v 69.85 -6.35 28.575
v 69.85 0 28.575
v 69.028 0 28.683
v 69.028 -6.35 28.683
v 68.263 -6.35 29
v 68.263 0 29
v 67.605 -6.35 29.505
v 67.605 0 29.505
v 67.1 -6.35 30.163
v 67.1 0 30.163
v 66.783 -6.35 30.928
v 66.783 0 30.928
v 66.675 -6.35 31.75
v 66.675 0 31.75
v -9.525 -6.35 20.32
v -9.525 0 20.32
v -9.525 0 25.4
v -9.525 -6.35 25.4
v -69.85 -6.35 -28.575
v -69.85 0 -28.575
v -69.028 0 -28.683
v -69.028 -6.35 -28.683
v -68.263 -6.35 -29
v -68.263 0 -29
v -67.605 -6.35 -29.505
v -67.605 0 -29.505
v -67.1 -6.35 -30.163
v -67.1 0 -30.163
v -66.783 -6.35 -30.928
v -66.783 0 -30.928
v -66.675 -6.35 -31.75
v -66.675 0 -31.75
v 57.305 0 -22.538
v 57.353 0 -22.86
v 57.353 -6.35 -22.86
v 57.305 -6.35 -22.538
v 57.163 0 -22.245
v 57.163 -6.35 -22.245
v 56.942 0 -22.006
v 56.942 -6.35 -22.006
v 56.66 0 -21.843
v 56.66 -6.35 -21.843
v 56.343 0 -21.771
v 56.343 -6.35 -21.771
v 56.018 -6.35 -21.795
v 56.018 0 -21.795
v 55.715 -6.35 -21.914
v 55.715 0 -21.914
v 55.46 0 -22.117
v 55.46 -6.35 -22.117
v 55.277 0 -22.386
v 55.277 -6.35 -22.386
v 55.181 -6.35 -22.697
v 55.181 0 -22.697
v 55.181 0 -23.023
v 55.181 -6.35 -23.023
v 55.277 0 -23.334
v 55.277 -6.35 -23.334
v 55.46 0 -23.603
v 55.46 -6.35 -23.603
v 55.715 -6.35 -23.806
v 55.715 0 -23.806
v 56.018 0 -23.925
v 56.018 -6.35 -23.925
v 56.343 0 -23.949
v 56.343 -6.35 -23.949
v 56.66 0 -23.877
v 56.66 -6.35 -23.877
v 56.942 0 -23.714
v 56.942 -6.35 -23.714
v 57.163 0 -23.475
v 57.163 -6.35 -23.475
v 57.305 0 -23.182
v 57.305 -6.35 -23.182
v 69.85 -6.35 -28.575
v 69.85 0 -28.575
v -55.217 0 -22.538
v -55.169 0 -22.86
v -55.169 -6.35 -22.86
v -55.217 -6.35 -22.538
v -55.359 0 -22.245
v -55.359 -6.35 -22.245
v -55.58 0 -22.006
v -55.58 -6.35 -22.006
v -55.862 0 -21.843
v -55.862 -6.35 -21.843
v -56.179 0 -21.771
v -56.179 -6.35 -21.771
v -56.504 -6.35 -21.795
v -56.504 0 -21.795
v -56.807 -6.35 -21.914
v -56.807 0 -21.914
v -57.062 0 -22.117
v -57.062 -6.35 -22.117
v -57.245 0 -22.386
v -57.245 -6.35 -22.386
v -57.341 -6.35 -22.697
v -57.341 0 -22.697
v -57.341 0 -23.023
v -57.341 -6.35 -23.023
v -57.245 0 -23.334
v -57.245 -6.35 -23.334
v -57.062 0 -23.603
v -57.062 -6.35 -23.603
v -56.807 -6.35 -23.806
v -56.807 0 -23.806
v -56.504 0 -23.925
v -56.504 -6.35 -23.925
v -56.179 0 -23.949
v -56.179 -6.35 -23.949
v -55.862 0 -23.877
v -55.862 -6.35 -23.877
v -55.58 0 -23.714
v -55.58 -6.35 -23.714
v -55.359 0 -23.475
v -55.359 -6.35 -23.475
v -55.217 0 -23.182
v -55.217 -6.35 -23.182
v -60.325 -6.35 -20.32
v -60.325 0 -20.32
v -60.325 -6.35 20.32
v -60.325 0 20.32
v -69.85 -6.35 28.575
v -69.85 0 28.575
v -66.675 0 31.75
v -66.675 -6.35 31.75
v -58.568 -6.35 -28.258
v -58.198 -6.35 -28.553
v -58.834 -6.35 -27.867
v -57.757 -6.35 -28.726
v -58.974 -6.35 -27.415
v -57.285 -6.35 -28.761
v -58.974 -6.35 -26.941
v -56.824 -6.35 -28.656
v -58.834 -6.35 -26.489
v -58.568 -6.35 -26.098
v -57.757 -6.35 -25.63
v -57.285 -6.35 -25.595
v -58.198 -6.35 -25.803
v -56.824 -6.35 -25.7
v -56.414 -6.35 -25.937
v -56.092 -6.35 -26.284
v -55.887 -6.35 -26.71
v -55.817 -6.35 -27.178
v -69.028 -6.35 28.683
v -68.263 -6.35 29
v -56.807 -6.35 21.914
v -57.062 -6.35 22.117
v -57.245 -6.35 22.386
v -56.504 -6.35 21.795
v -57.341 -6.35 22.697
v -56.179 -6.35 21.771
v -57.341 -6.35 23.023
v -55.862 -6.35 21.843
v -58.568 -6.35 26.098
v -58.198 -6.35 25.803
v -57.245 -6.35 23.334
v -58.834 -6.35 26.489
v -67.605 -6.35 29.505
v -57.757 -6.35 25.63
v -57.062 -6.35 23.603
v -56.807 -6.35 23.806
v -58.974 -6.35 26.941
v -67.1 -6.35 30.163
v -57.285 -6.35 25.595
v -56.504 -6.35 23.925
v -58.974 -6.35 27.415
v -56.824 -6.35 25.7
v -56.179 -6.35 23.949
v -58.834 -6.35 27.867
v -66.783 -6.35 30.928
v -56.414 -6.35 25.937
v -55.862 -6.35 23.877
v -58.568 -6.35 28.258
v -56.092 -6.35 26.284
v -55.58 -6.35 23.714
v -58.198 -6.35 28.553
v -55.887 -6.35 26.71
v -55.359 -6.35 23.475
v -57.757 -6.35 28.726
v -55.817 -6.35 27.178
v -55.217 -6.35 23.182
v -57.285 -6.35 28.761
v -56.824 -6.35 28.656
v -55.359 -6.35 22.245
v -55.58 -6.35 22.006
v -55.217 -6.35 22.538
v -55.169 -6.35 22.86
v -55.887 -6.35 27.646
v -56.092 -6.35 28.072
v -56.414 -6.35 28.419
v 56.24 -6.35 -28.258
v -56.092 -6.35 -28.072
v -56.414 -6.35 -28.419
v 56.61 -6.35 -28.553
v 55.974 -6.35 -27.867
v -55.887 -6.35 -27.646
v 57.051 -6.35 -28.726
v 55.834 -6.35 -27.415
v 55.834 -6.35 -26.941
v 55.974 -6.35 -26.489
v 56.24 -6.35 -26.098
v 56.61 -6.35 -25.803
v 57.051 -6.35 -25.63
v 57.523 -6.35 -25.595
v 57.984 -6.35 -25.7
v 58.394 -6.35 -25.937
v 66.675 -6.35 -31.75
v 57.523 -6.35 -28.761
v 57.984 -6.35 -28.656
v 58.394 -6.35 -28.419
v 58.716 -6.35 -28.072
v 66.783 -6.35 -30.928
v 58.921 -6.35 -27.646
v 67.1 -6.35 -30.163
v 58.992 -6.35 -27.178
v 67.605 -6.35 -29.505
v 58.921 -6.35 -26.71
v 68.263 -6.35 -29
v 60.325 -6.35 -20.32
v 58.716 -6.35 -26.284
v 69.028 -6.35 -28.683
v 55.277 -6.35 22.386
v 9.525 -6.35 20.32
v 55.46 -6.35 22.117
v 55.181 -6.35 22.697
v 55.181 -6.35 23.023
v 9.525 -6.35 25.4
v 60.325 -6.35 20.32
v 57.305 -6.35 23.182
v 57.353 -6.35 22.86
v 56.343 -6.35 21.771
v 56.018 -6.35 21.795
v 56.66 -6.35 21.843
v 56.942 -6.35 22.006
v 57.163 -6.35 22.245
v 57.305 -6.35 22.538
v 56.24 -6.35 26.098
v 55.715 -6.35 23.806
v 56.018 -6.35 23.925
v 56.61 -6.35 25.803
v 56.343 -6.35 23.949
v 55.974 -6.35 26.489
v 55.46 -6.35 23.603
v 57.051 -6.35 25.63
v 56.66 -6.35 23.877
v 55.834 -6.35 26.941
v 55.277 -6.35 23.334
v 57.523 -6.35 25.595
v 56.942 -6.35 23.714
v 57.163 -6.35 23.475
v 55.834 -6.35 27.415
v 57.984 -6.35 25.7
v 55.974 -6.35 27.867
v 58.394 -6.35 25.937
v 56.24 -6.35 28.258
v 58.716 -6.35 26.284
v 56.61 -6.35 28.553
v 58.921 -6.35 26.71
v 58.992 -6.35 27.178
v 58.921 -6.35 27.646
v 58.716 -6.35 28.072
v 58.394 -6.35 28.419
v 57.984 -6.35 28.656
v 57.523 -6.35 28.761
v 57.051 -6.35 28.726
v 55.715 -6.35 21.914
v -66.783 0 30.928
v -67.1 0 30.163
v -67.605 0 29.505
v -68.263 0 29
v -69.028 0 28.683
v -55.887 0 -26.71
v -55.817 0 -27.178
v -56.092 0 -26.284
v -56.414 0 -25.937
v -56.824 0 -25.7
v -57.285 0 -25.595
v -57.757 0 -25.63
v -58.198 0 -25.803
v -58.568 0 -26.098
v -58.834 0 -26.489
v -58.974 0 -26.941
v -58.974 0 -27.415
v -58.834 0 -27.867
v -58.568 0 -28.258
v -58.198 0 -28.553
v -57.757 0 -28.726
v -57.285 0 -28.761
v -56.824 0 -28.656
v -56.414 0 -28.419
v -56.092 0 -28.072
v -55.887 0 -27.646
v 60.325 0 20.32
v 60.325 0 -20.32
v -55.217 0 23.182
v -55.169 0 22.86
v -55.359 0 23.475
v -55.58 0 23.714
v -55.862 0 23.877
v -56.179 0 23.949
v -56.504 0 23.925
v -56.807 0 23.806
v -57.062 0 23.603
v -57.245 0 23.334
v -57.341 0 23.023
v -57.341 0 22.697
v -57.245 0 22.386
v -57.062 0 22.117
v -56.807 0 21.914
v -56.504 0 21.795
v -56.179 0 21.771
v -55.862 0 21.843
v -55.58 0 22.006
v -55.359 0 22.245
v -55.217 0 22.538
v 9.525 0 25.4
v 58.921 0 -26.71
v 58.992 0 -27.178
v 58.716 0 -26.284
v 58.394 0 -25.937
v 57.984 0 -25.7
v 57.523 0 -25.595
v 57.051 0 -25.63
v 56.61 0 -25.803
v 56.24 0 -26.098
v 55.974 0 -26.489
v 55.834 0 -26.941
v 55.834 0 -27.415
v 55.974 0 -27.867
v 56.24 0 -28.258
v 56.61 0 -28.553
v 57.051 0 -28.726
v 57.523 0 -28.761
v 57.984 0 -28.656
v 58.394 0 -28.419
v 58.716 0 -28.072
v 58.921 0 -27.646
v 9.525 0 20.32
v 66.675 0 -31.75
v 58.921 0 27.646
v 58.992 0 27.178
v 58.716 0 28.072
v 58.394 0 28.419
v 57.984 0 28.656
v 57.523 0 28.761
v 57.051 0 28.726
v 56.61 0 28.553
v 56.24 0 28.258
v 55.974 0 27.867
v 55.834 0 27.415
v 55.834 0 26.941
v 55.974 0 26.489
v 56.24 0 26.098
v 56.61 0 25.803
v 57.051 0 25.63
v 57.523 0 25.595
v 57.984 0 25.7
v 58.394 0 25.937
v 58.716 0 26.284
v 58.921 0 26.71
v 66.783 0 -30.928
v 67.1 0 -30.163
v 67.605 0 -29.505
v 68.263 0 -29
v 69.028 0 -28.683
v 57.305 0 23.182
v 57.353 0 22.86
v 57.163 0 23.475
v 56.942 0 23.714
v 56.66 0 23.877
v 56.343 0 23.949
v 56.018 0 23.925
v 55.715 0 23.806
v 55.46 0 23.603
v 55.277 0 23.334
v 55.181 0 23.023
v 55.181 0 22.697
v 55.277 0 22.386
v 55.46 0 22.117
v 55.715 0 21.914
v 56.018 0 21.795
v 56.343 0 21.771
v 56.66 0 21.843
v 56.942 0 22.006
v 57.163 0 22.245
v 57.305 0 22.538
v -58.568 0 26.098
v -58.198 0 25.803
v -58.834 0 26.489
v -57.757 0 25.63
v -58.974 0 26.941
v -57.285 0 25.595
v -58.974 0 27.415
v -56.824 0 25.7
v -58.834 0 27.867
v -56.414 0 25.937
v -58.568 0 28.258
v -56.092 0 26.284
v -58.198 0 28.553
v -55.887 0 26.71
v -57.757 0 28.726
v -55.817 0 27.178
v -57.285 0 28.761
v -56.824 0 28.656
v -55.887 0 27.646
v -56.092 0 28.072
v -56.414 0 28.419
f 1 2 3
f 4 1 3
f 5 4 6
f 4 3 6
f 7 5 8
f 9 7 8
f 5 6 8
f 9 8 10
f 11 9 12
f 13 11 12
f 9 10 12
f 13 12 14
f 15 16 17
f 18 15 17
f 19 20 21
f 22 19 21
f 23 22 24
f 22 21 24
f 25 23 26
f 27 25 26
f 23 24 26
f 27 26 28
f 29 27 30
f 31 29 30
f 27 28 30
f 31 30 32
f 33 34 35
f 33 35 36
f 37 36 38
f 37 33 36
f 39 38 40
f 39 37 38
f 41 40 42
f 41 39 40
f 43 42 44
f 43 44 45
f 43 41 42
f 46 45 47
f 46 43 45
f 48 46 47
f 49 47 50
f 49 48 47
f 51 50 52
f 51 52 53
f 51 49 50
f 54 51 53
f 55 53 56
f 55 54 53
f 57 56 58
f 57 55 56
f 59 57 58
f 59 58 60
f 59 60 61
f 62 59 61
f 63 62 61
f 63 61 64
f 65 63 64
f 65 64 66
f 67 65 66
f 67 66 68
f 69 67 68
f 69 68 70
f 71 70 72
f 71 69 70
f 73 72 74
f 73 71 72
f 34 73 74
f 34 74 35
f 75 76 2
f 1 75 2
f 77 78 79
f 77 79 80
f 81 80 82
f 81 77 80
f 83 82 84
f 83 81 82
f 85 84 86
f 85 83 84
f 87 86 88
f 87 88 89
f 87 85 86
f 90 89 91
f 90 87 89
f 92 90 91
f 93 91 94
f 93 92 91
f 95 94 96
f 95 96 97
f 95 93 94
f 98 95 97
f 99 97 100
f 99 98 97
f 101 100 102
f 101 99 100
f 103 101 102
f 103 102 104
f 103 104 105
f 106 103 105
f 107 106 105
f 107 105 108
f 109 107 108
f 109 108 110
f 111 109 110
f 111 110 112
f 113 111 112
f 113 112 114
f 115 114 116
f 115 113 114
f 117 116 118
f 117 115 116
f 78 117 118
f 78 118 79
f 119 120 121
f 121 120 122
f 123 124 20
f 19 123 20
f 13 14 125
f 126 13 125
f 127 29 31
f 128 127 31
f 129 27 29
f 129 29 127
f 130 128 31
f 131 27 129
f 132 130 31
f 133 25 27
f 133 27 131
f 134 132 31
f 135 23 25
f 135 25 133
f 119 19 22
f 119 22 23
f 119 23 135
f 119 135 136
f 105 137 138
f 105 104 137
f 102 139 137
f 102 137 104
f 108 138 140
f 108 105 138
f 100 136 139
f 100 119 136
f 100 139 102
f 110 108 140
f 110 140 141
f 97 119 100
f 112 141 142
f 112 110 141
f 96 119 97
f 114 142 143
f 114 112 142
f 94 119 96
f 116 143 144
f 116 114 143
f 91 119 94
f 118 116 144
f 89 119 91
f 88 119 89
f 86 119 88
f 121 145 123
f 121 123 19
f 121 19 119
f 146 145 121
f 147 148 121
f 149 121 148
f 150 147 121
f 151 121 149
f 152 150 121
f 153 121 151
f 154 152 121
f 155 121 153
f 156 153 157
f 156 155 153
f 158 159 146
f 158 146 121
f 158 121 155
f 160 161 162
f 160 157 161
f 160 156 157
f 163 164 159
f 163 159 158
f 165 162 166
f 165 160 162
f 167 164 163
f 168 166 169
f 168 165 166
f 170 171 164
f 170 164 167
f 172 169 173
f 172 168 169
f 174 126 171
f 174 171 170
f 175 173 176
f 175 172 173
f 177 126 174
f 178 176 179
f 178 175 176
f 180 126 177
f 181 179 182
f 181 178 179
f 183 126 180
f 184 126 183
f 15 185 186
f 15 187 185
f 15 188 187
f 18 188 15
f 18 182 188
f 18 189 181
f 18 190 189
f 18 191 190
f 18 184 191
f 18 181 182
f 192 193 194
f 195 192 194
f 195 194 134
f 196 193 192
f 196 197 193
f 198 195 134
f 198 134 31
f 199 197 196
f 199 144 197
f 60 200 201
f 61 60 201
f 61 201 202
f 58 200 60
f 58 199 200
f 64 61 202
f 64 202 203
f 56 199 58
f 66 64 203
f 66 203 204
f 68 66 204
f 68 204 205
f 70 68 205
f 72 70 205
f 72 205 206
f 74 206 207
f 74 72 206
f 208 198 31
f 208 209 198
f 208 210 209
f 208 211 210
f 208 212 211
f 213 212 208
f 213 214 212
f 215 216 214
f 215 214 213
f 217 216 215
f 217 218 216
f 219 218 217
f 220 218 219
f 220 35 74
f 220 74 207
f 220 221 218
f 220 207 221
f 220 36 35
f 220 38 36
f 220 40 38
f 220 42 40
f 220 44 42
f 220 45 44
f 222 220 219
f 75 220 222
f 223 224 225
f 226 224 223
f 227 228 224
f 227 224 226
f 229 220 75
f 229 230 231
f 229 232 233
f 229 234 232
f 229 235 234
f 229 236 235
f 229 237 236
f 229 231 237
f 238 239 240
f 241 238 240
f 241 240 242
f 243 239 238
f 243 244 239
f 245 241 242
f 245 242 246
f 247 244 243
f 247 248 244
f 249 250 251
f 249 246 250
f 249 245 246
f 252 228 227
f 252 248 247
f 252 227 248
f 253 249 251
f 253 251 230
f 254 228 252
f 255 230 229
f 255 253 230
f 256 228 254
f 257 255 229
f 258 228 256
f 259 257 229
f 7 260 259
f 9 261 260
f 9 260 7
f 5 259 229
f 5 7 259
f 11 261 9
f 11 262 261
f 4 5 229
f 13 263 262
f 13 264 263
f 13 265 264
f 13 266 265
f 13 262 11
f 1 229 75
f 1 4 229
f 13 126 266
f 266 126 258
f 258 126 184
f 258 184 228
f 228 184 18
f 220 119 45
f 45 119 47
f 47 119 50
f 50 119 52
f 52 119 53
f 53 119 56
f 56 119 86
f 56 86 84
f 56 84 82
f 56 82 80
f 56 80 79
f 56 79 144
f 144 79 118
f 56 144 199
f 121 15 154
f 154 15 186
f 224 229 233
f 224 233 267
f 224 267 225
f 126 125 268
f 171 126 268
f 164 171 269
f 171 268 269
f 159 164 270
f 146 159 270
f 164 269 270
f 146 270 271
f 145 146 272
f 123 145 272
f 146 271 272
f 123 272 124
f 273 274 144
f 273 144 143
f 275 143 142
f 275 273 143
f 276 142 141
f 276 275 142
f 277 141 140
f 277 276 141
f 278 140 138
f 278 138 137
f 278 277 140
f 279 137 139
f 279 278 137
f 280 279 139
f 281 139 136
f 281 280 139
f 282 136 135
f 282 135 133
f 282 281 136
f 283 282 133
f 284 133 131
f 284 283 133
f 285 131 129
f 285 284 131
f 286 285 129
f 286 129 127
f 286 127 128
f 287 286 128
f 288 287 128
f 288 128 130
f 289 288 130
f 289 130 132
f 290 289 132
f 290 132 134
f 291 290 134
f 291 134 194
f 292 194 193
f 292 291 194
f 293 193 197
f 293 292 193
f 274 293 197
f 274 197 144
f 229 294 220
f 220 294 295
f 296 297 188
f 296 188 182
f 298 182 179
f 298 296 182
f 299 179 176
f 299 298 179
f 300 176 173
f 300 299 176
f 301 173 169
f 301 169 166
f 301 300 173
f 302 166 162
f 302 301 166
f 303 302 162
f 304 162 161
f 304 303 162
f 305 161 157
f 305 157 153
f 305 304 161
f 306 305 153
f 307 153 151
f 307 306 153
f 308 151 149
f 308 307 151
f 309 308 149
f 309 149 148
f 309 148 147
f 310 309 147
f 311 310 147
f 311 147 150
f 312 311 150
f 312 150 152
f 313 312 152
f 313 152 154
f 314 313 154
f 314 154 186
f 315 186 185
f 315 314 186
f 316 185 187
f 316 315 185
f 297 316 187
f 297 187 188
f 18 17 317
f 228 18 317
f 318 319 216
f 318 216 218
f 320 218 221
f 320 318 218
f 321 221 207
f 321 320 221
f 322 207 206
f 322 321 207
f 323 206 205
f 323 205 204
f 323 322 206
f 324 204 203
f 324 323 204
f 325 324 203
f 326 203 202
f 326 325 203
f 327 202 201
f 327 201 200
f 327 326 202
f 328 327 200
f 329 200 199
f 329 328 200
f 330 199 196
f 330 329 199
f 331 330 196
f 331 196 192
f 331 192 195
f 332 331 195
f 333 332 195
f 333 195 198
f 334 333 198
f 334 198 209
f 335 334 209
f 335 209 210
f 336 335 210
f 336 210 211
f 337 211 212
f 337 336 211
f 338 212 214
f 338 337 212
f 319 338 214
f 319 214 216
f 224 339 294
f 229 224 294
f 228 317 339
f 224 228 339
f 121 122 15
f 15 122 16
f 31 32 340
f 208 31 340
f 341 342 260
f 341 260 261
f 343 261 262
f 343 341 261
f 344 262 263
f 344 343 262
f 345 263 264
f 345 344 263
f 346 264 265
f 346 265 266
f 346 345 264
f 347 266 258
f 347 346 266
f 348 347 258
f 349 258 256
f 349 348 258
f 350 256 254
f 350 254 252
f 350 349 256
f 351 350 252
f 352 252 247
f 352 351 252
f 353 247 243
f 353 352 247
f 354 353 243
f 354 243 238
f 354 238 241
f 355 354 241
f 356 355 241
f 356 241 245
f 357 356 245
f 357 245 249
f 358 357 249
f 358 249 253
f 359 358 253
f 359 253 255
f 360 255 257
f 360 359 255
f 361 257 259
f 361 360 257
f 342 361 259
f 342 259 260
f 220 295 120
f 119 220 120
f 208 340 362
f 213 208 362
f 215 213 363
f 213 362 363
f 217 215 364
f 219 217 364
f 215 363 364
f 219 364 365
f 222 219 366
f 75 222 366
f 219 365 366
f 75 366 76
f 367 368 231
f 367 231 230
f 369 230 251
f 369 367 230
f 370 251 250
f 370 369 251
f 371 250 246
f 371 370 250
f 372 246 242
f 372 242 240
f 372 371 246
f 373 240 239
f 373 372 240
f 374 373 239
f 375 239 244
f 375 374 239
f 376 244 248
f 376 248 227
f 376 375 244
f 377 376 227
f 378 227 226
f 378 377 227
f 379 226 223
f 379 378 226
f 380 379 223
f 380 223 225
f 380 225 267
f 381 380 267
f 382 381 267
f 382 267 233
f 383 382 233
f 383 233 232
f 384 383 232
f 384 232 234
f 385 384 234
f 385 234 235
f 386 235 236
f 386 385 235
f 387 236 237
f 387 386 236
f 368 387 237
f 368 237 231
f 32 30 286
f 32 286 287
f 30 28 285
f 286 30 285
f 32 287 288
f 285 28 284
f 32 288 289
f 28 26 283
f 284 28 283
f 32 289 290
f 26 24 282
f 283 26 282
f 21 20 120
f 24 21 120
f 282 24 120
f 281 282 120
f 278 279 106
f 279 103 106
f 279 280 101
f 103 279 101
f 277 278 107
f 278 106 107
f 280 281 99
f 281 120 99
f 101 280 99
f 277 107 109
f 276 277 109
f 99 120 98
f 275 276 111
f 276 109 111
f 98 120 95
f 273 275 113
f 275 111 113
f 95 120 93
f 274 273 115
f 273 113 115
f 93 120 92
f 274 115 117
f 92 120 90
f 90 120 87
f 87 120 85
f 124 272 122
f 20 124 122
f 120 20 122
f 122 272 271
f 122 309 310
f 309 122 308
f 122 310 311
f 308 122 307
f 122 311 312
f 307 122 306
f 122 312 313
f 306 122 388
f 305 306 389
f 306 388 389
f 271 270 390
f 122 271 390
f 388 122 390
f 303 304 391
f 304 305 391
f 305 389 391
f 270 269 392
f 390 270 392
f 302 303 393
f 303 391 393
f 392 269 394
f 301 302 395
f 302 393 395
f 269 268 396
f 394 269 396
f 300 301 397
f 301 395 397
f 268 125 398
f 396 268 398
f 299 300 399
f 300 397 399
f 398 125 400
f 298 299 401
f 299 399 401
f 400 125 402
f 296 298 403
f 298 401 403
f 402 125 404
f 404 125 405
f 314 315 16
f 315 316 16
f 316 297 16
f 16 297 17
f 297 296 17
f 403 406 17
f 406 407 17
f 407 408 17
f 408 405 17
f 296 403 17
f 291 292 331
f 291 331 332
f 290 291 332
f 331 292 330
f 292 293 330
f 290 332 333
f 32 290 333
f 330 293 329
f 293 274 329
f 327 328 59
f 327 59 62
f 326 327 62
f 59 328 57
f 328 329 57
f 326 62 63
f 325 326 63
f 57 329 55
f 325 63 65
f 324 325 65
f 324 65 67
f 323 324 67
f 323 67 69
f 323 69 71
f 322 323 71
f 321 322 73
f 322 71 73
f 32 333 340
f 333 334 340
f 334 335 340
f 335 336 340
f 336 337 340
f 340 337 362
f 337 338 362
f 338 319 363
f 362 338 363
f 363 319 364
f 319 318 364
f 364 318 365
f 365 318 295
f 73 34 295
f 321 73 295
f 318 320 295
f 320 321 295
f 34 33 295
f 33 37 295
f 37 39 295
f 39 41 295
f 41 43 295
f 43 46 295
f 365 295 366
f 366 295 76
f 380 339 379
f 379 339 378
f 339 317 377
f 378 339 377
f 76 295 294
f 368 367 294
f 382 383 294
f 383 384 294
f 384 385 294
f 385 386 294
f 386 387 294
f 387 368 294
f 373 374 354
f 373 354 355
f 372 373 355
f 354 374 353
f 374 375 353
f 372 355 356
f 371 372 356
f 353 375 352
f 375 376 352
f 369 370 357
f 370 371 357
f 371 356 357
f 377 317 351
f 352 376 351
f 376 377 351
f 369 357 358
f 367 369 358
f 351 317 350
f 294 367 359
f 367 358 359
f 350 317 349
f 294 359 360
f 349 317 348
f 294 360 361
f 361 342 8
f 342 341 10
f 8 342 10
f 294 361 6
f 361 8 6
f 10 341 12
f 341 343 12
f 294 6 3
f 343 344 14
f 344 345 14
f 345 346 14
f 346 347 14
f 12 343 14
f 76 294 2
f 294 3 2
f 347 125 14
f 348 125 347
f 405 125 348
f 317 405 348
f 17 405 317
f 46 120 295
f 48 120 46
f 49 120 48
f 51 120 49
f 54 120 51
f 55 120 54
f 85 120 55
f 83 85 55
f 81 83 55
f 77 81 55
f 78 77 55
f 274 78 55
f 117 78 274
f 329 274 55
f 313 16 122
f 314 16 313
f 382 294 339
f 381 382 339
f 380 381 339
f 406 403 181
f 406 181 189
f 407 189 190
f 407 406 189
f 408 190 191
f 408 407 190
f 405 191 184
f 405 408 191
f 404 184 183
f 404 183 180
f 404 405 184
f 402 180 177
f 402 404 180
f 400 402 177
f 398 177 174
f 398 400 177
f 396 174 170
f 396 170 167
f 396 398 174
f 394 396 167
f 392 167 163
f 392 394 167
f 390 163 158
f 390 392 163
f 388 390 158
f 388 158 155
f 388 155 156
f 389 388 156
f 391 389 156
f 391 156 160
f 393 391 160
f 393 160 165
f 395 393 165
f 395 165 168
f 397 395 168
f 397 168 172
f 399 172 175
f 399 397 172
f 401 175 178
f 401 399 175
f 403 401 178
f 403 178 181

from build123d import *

# Parameters (mm, degrees)
F0_R     = 1.0922
F0_R_2   = 1.5875
F1_DEPTH = 6.35


with BuildPart() as f1:
    # F0 (on Front) → F1 (new body)
    with BuildSketch(Plane.XZ):
        with BuildLine():
            Line((66.675, 31.75), (-66.675, 31.75))
            ThreePointArc((-66.675, 31.75), (-67.604936, 29.504936), (-69.85, 28.575))
            Line((-69.85, 28.575), (-69.85, 0))
            Line((-69.85, 0), (-60.325, 0))
            Line((-60.325, 0), (-60.325, 20.32))
            Line((-60.325, 20.32), (-9.525, 20.32))
            Line((-9.525, 20.32), (-9.525, 25.4))
            Line((-9.525, 25.4), (9.525, 25.4))
            Line((9.525, 25.4), (9.525, 20.32))
            Line((9.525, 20.32), (60.325, 20.32))
            Line((60.325, 20.32), (60.325, 0))
            Line((60.325, 0), (69.85, 0))
            Line((69.85, 0), (69.85, 28.575))
            ThreePointArc((69.85, 28.575), (67.604936, 29.504936), (66.675, 31.75))
        make_face()
        with Locations((-56.261, 22.86)):
            Circle(F0_R, mode=Mode.SUBTRACT)
        with Locations((-57.404, 27.178)):
            Circle(F0_R_2, mode=Mode.SUBTRACT)
        with Locations((56.261, 22.86)):
            Circle(F0_R, mode=Mode.SUBTRACT)
        with Locations((57.404, 27.178)):
            Circle(F0_R_2, mode=Mode.SUBTRACT)
        with BuildLine():
            Line((-60.325, 0), (-69.85, 0))
            Line((-69.85, 0), (-69.85, -28.575))
            ThreePointArc((-69.85, -28.575), (-67.604936, -29.504936), (-66.675, -31.75))
            Line((-66.675, -31.75), (66.675, -31.75))
            ThreePointArc((66.675, -31.75), (67.604936, -29.504936), (69.85, -28.575))
            Line((69.85, -28.575), (69.85, 0))
            Line((69.85, 0), (60.325, 0))
            Line((60.325, 0), (60.325, -20.32))
            Line((60.325, -20.32), (-60.325, -20.32))
            Line((-60.325, -20.32), (-60.325, 0))
        make_face()
        with Locations((-57.404, -27.178)):
            Circle(F0_R_2, mode=Mode.SUBTRACT)
        with Locations((-56.261, -22.86)):
            Circle(F0_R, mode=Mode.SUBTRACT)
        with Locations((57.404, -27.178)):
            Circle(F0_R_2, mode=Mode.SUBTRACT)
        with Locations((56.261, -22.86)):
            Circle(F0_R, mode=Mode.SUBTRACT)
    extrude(amount=F1_DEPTH)


solid = f1.part
